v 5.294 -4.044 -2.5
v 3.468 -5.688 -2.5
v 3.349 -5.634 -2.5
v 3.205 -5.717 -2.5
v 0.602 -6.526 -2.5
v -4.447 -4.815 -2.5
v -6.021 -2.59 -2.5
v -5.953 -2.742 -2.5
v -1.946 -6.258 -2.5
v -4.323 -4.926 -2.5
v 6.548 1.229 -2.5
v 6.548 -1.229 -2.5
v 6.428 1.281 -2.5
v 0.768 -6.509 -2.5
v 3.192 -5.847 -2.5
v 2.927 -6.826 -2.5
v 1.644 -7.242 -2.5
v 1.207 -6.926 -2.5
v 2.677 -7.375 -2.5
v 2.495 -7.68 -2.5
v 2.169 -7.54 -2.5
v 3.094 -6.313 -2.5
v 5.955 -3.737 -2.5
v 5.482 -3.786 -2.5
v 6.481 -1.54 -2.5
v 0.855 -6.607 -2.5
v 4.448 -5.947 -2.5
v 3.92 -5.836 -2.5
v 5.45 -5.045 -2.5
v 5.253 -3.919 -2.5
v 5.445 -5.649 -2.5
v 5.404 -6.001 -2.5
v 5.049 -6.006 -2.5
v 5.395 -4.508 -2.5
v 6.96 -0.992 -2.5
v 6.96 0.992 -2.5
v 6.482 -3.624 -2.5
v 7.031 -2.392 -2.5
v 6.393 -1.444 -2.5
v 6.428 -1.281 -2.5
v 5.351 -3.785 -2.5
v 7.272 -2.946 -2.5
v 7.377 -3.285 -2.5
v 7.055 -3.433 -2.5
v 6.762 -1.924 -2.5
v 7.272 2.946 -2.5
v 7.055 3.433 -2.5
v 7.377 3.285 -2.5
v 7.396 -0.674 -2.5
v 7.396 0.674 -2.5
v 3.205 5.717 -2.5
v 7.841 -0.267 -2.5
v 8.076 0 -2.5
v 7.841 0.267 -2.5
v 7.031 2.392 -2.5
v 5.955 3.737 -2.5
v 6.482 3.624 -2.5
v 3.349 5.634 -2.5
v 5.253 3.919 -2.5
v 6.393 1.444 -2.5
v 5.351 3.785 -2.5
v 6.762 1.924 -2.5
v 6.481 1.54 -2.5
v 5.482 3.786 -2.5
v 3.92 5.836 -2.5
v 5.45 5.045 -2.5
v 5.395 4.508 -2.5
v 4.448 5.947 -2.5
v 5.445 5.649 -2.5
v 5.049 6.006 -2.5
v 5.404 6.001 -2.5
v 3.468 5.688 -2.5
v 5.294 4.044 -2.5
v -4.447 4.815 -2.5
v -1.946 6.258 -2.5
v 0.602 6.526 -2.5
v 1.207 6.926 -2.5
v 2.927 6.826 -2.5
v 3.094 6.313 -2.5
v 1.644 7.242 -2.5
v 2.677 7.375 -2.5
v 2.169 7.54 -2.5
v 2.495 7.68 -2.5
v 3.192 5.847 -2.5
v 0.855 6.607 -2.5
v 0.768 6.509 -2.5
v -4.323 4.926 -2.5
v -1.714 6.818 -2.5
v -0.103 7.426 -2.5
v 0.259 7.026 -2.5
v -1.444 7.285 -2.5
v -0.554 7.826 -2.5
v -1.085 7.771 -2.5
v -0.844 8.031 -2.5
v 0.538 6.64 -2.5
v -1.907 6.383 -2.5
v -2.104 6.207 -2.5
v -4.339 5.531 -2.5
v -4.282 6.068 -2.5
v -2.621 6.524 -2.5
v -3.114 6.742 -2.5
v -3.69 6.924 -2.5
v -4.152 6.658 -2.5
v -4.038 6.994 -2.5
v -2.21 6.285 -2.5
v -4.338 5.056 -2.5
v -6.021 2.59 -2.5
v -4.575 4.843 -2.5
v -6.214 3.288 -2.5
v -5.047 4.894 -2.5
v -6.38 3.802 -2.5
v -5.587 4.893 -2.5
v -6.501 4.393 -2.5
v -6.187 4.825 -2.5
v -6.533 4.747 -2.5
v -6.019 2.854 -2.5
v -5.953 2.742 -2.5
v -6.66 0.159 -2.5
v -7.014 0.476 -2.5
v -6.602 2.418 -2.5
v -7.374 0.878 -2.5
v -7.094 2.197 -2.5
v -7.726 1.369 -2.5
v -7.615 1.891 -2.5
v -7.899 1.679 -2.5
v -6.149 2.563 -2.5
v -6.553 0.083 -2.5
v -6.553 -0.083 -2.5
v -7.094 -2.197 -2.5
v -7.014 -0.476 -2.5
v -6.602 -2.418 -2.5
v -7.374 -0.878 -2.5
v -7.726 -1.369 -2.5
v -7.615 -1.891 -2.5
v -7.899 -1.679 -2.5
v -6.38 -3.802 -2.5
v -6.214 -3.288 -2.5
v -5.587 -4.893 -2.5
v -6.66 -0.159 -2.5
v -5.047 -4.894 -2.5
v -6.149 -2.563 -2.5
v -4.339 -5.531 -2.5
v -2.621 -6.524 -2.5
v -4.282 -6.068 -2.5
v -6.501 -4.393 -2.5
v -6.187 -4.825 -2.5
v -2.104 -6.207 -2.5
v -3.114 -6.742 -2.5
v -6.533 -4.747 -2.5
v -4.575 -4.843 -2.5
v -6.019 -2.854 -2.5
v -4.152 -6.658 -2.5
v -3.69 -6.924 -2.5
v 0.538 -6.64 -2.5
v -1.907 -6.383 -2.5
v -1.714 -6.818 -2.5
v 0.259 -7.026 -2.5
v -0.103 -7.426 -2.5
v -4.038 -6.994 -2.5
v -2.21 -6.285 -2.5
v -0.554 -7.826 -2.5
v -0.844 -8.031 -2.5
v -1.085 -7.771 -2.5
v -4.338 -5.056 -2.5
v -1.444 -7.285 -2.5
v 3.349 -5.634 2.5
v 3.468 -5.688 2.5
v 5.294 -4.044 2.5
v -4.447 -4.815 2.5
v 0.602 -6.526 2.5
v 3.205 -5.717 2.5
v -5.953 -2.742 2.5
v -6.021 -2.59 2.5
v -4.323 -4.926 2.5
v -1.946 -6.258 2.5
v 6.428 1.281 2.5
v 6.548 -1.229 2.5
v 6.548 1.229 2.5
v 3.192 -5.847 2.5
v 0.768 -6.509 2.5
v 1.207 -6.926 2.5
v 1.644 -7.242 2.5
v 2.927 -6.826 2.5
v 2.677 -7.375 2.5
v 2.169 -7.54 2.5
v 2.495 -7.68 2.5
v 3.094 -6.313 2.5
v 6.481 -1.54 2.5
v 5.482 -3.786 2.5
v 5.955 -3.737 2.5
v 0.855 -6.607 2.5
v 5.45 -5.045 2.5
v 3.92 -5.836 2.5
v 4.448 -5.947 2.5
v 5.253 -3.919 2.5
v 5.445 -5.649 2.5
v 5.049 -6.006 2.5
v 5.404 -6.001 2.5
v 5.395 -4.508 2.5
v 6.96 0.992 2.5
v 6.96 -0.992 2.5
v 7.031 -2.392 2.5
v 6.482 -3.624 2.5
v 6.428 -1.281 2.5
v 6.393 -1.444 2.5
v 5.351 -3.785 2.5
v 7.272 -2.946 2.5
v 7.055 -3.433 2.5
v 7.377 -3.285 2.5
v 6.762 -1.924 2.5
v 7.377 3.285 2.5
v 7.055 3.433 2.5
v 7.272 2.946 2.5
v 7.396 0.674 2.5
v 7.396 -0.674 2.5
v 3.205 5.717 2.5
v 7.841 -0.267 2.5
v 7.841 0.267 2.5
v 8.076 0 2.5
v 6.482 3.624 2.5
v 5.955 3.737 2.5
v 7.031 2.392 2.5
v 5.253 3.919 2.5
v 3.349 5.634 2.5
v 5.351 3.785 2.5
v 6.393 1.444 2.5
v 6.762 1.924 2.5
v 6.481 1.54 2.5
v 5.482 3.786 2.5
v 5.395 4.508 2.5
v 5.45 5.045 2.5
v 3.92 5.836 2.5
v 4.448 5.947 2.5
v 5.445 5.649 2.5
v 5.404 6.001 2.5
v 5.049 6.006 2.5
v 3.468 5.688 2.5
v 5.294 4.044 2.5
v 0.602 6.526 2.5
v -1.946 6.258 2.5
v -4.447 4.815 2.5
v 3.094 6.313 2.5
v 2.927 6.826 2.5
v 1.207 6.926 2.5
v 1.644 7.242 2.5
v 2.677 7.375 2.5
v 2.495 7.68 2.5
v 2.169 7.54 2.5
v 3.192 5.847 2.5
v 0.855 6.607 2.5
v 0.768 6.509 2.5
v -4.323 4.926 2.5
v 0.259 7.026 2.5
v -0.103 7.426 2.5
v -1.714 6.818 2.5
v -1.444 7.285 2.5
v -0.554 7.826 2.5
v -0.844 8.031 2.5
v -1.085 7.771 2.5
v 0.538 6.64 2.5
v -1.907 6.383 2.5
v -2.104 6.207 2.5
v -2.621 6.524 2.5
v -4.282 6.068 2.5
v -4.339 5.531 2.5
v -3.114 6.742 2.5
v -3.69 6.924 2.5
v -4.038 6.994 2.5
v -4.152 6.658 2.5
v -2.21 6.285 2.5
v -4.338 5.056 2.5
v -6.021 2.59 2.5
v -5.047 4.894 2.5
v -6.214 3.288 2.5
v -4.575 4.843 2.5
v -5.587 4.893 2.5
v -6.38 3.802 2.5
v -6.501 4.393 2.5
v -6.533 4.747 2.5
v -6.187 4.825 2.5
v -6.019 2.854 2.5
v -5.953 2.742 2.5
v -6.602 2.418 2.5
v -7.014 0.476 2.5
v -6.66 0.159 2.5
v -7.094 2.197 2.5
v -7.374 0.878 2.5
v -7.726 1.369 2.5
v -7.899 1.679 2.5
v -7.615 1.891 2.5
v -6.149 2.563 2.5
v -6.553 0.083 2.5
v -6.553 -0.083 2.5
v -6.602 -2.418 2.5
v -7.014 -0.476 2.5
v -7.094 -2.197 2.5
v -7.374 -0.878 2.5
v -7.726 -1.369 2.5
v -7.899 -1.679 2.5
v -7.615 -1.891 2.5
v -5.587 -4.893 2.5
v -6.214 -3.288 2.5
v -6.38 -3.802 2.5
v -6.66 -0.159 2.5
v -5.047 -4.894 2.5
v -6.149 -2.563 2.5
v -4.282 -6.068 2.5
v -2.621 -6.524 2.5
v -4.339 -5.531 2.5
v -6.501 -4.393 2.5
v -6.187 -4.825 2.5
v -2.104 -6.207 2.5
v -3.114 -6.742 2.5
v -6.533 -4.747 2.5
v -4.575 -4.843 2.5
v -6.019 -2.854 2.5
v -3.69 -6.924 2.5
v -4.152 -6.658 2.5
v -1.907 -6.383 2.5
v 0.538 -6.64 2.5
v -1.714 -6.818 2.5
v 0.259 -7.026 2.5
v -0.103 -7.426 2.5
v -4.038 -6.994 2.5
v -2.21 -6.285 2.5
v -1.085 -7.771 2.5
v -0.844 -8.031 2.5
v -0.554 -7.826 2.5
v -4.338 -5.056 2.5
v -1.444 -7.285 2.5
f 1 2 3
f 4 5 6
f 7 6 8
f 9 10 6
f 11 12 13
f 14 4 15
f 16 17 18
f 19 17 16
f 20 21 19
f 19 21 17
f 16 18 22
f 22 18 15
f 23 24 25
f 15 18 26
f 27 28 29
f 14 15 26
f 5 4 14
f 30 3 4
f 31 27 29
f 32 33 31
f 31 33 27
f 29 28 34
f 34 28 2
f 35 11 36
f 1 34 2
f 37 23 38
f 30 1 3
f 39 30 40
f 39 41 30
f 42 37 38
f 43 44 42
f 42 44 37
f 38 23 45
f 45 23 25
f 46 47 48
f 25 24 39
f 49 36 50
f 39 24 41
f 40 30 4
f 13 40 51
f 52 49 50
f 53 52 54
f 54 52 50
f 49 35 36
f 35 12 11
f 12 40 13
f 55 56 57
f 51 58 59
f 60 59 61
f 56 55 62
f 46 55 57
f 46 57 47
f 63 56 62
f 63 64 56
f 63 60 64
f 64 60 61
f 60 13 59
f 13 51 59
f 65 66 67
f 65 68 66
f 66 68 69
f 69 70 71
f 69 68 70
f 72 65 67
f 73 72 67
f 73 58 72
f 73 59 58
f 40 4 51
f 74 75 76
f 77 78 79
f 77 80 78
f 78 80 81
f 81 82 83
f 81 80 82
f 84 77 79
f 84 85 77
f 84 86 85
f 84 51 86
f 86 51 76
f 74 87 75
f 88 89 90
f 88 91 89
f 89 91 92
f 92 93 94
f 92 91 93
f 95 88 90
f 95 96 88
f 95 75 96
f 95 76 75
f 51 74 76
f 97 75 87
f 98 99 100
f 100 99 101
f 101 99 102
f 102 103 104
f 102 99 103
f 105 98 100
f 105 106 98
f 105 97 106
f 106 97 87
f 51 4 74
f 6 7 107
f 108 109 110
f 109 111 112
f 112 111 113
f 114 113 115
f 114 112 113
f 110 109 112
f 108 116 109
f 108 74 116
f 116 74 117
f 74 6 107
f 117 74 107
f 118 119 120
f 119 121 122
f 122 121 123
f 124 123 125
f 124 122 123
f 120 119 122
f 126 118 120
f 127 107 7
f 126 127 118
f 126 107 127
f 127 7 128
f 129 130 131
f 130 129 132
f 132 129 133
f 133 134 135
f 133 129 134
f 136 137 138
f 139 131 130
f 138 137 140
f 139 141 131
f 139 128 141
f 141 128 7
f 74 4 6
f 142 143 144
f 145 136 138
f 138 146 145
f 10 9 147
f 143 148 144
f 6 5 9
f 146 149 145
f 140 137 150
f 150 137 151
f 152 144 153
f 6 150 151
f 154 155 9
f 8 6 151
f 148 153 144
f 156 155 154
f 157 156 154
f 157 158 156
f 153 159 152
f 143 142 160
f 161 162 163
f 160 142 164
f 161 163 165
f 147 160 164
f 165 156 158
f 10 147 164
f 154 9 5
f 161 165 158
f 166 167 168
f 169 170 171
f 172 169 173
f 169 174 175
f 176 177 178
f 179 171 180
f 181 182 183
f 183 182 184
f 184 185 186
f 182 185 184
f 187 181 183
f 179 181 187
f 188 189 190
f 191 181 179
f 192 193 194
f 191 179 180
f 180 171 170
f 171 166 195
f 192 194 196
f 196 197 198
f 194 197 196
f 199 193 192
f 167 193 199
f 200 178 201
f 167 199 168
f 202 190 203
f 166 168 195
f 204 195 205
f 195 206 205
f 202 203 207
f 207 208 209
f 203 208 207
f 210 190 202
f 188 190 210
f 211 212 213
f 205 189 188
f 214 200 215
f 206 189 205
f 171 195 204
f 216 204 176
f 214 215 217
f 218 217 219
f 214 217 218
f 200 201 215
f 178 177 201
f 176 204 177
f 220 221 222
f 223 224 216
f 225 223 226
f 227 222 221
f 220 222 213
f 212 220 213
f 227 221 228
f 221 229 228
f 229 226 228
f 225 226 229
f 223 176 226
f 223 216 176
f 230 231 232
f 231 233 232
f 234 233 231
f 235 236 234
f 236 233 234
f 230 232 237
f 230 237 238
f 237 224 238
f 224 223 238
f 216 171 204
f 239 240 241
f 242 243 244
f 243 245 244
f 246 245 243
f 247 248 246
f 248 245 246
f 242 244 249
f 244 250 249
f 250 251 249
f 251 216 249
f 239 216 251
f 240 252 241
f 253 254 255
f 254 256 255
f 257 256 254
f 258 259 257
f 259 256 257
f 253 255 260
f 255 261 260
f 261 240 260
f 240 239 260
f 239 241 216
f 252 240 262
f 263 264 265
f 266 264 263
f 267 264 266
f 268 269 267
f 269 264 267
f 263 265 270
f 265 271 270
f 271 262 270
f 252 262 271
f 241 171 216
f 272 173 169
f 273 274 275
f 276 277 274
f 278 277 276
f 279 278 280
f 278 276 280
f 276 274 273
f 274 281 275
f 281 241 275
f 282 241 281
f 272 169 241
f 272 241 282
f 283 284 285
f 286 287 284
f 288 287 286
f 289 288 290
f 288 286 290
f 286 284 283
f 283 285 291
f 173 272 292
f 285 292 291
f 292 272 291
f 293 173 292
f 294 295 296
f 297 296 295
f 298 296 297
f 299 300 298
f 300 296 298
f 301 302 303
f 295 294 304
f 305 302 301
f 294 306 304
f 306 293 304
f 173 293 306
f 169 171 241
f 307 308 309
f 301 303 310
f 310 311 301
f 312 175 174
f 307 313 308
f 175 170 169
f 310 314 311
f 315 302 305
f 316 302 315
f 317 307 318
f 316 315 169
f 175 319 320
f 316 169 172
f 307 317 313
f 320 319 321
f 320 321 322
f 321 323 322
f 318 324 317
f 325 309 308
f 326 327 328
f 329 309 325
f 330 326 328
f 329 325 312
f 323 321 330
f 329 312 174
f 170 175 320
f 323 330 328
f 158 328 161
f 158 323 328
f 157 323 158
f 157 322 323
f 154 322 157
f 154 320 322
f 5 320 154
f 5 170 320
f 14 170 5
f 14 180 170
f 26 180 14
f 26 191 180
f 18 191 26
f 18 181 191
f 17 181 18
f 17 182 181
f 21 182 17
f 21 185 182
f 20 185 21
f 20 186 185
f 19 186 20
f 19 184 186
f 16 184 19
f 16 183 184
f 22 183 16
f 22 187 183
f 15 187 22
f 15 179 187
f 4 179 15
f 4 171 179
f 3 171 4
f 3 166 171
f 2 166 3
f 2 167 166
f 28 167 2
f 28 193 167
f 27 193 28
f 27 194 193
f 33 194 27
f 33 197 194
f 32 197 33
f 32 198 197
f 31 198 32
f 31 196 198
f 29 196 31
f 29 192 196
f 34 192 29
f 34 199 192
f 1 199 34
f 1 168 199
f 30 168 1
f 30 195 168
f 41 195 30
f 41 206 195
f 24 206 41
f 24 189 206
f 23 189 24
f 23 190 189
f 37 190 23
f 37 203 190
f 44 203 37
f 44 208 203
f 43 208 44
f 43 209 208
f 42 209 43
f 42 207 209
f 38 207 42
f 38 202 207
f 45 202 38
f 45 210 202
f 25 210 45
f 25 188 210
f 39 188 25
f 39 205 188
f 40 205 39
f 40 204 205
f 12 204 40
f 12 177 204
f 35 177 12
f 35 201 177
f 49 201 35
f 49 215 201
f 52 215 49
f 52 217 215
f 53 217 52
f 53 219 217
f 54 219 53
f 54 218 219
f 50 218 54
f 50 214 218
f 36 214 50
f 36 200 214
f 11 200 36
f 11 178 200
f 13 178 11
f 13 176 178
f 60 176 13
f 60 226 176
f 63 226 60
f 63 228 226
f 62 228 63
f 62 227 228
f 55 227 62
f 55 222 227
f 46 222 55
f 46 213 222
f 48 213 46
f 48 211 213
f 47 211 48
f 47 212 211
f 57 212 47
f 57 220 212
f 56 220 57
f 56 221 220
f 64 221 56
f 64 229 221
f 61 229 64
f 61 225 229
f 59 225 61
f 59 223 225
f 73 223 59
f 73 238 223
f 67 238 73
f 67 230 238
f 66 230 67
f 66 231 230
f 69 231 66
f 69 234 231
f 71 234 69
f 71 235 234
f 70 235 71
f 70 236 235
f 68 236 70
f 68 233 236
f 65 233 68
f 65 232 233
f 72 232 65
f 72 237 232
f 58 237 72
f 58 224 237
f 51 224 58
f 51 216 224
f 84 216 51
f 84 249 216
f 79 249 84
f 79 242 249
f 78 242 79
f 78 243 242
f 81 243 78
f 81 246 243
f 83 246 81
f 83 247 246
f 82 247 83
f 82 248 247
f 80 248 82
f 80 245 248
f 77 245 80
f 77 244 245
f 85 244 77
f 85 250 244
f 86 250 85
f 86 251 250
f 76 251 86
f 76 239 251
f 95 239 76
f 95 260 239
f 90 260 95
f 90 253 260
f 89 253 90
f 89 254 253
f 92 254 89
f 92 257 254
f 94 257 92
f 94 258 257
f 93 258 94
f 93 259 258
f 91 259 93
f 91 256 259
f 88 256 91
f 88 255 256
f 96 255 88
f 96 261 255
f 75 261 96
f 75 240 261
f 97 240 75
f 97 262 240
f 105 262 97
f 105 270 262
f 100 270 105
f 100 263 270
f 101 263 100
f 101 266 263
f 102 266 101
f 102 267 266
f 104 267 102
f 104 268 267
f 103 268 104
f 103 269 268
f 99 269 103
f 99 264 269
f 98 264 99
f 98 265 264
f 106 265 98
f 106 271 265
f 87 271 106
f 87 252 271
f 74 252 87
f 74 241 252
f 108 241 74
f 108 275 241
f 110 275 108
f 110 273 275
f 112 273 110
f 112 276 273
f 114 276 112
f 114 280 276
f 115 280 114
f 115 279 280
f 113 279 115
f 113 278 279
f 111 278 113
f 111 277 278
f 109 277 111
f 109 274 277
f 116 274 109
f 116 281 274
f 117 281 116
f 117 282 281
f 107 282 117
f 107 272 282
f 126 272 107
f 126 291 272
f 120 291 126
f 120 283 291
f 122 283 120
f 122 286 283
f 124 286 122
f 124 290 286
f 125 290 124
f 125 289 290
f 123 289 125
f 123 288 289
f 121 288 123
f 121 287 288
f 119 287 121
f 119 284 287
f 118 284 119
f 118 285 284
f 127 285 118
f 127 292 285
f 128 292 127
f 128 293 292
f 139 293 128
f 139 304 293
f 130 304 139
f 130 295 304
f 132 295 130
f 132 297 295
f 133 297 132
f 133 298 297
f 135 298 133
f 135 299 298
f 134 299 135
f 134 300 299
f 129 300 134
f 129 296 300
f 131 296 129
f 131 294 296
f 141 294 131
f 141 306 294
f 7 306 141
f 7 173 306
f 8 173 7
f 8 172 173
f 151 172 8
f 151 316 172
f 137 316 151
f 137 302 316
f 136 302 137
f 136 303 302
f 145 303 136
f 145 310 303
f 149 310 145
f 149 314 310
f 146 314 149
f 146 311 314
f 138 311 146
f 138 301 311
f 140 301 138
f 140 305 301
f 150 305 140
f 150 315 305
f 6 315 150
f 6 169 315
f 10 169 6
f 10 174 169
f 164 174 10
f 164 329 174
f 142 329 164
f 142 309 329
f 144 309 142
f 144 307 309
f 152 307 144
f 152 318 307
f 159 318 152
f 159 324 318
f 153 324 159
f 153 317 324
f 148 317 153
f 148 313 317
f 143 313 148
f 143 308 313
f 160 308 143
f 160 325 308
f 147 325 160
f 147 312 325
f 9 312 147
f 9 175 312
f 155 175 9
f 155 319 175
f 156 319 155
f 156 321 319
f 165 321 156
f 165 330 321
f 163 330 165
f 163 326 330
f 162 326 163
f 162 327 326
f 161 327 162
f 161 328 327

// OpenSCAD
//
//  differential_planetary_gearbox
//
//  Copyright 2014 by Ron Aldrich.
//
//  License: CC-By-SA - http://creativecommons.org/licenses/by-sa/3.0/deed.en_US
//

gear(
	number_of_teeth=15,
 	modulus=1,
	pressure_angle=45,
	depth_ratio=.5,
	clearance=.25,
	h=5,
	center=true);

function gear_outer_radius(number_of_teeth,
	modulus,
	depth_ratio,
	clearance) = (number_of_teeth*modulus/2)+depth_ratio*(modulus*PI)/2-clearance/2;

function gear_pitch_radius(number_of_teeth, modulus) = number_of_teeth*modulus/2;

module gear (
	number_of_teeth,
	modulus,
	pressure_angle,
	depth_ratio,
	clearance,
	h,
	center=false)
{
	linear_extrude(height=h, center=center, convexity=4)
	{
		gear2D(number_of_teeth, modulus, pressure_angle, depth_ratio, clearance);
	}
}

module gear2D (
	number_of_teeth,
	modulus,
	pressure_angle,
	depth_ratio,
	clearance)
{
	circular_pitch = modulus*PI;
	pitch_radius = gear_pitch_radius(number_of_teeth, modulus);
	base_radius = pitch_radius*cos(pressure_angle);
	depth=circular_pitch/(2*tan(pressure_angle));
	outer_radius = clearance<0 ? pitch_radius+depth/2-clearance : pitch_radius+depth/2;
	root_radius1 = pitch_radius-depth/2-clearance/2;
	root_radius = (clearance<0 && root_radius1<base_radius) ? base_radius : root_radius1;
	backlash_angle = clearance/(pitch_radius*cos(pressure_angle)) * 180 / PI;
	half_thick_angle = 90/number_of_teeth - backlash_angle/2;
	pitch_point = involute (base_radius, involute_intersect_angle (base_radius, pitch_radius));
	pitch_angle = atan2 (pitch_point[1], pitch_point[0]);
	min_radius = max (base_radius,root_radius);

	*echo("circular_pitch = ", circular_pitch,
		"pitch_radius = ", pitch_radius,
		"base_radius = ", base_radius,
		"depth = ", depth,
		"outer_radius = ", outer_radius);

	intersection()
	{
		rotate(90/number_of_teeth)
			circle($fn=number_of_teeth*3,r=pitch_radius+depth_ratio*circular_pitch/2-clearance/2);
		union()
		{
			rotate(90/number_of_teeth)
				circle($fn=number_of_teeth*2,r=max(root_radius,pitch_radius-depth_ratio*circular_pitch/2-clearance/2));
			for (i = [1:number_of_teeth])rotate(i*360/number_of_teeth)
			{
				halftooth (
					pitch_angle,
					base_radius,
					min_radius,
					outer_radius,
					half_thick_angle);		
				mirror([0,1]) halftooth (
					pitch_angle,
					base_radius,
					min_radius,
					outer_radius,
					half_thick_angle);
			}
		}
	}
}

module halftooth (
	pitch_angle,
	base_radius,
	min_radius,
	outer_radius,
	half_thick_angle)
{
	index=[0,1,2,3,4,5];
	start_angle = max(involute_intersect_angle (base_radius, min_radius)-5,0);
	stop_angle = involute_intersect_angle (base_radius, outer_radius);
	angle=index*(stop_angle-start_angle)/index[len(index)-1];
	p=[[0,0],
	involute(base_radius,angle[0]+start_angle),
	involute(base_radius,angle[1]+start_angle),
	involute(base_radius,angle[2]+start_angle),
	involute(base_radius,angle[3]+start_angle),
	involute(base_radius,angle[4]+start_angle),
	involute(base_radius,angle[5]+start_angle)];

	difference()	
	{
		rotate(-pitch_angle-half_thick_angle)polygon(points=p);
		square(2*outer_radius);
	}
}

// Mathematical Functions
//===============

// Finds the angle of the involute about the base radius at the given distance (radius) from it's center.
//source: http://www.mathhelpforum.com/math-help/geometry/136011-circle-involute-solving-y-any-given-x.html

function involute_intersect_angle (base_radius, radius) = sqrt (pow (radius/base_radius, 2) - 1) * 180 / PI;

// Calculate the involute position for a given base radius and involute angle.

function involute (base_radius, involute_angle) =
[
	base_radius*(cos (involute_angle) + involute_angle*PI/180*sin (involute_angle)),
	base_radius*(sin (involute_angle) - involute_angle*PI/180*cos (involute_angle))
];
